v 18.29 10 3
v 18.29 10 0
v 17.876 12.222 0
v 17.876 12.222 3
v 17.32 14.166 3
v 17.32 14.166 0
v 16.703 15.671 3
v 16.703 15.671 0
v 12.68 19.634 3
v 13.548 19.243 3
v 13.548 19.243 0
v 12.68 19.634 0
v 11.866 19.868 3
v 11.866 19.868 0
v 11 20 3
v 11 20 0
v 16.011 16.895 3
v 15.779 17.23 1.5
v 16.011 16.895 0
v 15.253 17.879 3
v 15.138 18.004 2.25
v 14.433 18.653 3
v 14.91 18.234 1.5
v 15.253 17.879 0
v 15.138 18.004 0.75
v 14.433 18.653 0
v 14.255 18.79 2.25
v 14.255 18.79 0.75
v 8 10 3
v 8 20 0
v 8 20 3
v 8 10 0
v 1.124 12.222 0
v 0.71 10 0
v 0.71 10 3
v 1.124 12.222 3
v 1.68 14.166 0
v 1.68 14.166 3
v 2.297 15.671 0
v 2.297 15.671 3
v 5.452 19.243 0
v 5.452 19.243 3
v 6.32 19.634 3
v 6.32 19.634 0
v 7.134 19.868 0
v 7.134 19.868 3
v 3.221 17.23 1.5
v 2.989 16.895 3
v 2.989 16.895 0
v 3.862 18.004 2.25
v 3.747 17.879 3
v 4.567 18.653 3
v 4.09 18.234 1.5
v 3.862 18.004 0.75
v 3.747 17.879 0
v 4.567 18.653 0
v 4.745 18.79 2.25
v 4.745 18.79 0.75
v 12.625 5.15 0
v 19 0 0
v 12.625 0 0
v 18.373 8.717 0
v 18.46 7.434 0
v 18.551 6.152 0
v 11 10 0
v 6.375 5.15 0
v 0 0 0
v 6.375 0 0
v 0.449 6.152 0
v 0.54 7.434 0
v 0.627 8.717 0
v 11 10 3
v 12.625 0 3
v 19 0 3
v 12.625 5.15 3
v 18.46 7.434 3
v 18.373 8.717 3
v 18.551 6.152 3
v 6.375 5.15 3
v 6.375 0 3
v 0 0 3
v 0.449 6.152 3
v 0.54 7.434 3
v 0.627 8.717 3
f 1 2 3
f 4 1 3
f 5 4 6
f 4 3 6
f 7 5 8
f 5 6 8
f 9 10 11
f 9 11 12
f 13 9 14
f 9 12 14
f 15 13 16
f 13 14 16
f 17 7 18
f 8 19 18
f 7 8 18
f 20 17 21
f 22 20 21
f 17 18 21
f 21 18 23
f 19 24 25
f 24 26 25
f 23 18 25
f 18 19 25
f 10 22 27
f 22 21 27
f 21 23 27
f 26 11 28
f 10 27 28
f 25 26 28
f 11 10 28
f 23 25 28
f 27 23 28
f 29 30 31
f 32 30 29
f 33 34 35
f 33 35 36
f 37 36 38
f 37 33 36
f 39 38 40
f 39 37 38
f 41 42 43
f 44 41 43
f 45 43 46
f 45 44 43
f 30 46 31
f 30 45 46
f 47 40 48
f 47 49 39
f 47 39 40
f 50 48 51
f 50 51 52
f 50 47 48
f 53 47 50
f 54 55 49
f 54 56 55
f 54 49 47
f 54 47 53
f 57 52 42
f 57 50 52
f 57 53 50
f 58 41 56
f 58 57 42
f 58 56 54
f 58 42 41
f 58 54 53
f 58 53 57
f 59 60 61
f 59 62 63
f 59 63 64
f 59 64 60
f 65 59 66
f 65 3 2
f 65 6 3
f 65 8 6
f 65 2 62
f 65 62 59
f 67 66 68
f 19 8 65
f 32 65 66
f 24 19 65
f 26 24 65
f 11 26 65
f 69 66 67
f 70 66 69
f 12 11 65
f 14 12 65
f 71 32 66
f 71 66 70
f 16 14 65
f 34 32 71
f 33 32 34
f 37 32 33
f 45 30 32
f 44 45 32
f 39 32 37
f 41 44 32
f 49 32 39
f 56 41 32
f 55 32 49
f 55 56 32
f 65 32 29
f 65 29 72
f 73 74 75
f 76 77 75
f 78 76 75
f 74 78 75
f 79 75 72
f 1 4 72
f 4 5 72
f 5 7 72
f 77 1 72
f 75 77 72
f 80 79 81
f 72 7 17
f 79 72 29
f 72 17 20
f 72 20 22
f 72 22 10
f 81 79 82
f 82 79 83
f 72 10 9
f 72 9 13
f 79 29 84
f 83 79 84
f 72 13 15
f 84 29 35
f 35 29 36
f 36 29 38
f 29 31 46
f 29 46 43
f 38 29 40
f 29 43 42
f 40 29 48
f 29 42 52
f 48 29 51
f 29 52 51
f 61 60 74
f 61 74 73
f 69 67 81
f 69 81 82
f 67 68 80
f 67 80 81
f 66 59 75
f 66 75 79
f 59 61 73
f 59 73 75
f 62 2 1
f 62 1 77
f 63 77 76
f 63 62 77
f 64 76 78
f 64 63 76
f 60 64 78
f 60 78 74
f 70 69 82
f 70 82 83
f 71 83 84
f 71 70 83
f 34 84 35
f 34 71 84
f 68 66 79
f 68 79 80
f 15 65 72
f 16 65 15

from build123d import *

# Parameters (mm, degrees)
RESSALTO_EXTRUS_O1_DEPTH = 3


with BuildPart() as part:
    # Esboço1 → Ressalto-extrusão1 (new body)
    with BuildSketch(Plane.XY):
        with BuildLine():
            Line((19, 0), (12.625, 0))
            Line((12.625, 0), (12.625, 5.15))
            Line((12.625, 5.15), (11, 5.15))
            Line((11, 5.15), (8, 5.15))
            Line((8, 5.15), (6.375, 5.15))
            Line((6.375, 5.15), (6.375, 0))
            Line((6.375, 0), (0, 0))
            Line((0, 0), (0.448555141, 6.151613366))
            ThreePointArc((0.448555141, 6.151613366), (0.584055906, 8.075483405), (0.710041083, 10))
            add(Edge.make_bspline(
                [(0.710041083, 10), (2.087312964, 19.459463986), (8, 20)],
                knots=[0, 0, 0, 0.891892797, 0.891892797, 0.891892797], degree=2))
            Line((8, 20), (8, 10))
            Line((8, 10), (11, 10))
            Line((11, 10), (11, 20))
            add(Edge.make_bspline(
                [(18.289958917, 10), (16.912687036, 19.459463986), (11, 20)],
                knots=[0, 0, 0, 0.891892797, 0.891892797, 0.891892797], degree=2))
            ThreePointArc((18.289958917, 10), (18.415944094, 8.075483405), (18.551444859, 6.151613366))
            Line((18.551444859, 6.151613366), (19, 0))
        make_face()
    extrude(amount=RESSALTO_EXTRUS_O1_DEPTH)


solid = part.part
